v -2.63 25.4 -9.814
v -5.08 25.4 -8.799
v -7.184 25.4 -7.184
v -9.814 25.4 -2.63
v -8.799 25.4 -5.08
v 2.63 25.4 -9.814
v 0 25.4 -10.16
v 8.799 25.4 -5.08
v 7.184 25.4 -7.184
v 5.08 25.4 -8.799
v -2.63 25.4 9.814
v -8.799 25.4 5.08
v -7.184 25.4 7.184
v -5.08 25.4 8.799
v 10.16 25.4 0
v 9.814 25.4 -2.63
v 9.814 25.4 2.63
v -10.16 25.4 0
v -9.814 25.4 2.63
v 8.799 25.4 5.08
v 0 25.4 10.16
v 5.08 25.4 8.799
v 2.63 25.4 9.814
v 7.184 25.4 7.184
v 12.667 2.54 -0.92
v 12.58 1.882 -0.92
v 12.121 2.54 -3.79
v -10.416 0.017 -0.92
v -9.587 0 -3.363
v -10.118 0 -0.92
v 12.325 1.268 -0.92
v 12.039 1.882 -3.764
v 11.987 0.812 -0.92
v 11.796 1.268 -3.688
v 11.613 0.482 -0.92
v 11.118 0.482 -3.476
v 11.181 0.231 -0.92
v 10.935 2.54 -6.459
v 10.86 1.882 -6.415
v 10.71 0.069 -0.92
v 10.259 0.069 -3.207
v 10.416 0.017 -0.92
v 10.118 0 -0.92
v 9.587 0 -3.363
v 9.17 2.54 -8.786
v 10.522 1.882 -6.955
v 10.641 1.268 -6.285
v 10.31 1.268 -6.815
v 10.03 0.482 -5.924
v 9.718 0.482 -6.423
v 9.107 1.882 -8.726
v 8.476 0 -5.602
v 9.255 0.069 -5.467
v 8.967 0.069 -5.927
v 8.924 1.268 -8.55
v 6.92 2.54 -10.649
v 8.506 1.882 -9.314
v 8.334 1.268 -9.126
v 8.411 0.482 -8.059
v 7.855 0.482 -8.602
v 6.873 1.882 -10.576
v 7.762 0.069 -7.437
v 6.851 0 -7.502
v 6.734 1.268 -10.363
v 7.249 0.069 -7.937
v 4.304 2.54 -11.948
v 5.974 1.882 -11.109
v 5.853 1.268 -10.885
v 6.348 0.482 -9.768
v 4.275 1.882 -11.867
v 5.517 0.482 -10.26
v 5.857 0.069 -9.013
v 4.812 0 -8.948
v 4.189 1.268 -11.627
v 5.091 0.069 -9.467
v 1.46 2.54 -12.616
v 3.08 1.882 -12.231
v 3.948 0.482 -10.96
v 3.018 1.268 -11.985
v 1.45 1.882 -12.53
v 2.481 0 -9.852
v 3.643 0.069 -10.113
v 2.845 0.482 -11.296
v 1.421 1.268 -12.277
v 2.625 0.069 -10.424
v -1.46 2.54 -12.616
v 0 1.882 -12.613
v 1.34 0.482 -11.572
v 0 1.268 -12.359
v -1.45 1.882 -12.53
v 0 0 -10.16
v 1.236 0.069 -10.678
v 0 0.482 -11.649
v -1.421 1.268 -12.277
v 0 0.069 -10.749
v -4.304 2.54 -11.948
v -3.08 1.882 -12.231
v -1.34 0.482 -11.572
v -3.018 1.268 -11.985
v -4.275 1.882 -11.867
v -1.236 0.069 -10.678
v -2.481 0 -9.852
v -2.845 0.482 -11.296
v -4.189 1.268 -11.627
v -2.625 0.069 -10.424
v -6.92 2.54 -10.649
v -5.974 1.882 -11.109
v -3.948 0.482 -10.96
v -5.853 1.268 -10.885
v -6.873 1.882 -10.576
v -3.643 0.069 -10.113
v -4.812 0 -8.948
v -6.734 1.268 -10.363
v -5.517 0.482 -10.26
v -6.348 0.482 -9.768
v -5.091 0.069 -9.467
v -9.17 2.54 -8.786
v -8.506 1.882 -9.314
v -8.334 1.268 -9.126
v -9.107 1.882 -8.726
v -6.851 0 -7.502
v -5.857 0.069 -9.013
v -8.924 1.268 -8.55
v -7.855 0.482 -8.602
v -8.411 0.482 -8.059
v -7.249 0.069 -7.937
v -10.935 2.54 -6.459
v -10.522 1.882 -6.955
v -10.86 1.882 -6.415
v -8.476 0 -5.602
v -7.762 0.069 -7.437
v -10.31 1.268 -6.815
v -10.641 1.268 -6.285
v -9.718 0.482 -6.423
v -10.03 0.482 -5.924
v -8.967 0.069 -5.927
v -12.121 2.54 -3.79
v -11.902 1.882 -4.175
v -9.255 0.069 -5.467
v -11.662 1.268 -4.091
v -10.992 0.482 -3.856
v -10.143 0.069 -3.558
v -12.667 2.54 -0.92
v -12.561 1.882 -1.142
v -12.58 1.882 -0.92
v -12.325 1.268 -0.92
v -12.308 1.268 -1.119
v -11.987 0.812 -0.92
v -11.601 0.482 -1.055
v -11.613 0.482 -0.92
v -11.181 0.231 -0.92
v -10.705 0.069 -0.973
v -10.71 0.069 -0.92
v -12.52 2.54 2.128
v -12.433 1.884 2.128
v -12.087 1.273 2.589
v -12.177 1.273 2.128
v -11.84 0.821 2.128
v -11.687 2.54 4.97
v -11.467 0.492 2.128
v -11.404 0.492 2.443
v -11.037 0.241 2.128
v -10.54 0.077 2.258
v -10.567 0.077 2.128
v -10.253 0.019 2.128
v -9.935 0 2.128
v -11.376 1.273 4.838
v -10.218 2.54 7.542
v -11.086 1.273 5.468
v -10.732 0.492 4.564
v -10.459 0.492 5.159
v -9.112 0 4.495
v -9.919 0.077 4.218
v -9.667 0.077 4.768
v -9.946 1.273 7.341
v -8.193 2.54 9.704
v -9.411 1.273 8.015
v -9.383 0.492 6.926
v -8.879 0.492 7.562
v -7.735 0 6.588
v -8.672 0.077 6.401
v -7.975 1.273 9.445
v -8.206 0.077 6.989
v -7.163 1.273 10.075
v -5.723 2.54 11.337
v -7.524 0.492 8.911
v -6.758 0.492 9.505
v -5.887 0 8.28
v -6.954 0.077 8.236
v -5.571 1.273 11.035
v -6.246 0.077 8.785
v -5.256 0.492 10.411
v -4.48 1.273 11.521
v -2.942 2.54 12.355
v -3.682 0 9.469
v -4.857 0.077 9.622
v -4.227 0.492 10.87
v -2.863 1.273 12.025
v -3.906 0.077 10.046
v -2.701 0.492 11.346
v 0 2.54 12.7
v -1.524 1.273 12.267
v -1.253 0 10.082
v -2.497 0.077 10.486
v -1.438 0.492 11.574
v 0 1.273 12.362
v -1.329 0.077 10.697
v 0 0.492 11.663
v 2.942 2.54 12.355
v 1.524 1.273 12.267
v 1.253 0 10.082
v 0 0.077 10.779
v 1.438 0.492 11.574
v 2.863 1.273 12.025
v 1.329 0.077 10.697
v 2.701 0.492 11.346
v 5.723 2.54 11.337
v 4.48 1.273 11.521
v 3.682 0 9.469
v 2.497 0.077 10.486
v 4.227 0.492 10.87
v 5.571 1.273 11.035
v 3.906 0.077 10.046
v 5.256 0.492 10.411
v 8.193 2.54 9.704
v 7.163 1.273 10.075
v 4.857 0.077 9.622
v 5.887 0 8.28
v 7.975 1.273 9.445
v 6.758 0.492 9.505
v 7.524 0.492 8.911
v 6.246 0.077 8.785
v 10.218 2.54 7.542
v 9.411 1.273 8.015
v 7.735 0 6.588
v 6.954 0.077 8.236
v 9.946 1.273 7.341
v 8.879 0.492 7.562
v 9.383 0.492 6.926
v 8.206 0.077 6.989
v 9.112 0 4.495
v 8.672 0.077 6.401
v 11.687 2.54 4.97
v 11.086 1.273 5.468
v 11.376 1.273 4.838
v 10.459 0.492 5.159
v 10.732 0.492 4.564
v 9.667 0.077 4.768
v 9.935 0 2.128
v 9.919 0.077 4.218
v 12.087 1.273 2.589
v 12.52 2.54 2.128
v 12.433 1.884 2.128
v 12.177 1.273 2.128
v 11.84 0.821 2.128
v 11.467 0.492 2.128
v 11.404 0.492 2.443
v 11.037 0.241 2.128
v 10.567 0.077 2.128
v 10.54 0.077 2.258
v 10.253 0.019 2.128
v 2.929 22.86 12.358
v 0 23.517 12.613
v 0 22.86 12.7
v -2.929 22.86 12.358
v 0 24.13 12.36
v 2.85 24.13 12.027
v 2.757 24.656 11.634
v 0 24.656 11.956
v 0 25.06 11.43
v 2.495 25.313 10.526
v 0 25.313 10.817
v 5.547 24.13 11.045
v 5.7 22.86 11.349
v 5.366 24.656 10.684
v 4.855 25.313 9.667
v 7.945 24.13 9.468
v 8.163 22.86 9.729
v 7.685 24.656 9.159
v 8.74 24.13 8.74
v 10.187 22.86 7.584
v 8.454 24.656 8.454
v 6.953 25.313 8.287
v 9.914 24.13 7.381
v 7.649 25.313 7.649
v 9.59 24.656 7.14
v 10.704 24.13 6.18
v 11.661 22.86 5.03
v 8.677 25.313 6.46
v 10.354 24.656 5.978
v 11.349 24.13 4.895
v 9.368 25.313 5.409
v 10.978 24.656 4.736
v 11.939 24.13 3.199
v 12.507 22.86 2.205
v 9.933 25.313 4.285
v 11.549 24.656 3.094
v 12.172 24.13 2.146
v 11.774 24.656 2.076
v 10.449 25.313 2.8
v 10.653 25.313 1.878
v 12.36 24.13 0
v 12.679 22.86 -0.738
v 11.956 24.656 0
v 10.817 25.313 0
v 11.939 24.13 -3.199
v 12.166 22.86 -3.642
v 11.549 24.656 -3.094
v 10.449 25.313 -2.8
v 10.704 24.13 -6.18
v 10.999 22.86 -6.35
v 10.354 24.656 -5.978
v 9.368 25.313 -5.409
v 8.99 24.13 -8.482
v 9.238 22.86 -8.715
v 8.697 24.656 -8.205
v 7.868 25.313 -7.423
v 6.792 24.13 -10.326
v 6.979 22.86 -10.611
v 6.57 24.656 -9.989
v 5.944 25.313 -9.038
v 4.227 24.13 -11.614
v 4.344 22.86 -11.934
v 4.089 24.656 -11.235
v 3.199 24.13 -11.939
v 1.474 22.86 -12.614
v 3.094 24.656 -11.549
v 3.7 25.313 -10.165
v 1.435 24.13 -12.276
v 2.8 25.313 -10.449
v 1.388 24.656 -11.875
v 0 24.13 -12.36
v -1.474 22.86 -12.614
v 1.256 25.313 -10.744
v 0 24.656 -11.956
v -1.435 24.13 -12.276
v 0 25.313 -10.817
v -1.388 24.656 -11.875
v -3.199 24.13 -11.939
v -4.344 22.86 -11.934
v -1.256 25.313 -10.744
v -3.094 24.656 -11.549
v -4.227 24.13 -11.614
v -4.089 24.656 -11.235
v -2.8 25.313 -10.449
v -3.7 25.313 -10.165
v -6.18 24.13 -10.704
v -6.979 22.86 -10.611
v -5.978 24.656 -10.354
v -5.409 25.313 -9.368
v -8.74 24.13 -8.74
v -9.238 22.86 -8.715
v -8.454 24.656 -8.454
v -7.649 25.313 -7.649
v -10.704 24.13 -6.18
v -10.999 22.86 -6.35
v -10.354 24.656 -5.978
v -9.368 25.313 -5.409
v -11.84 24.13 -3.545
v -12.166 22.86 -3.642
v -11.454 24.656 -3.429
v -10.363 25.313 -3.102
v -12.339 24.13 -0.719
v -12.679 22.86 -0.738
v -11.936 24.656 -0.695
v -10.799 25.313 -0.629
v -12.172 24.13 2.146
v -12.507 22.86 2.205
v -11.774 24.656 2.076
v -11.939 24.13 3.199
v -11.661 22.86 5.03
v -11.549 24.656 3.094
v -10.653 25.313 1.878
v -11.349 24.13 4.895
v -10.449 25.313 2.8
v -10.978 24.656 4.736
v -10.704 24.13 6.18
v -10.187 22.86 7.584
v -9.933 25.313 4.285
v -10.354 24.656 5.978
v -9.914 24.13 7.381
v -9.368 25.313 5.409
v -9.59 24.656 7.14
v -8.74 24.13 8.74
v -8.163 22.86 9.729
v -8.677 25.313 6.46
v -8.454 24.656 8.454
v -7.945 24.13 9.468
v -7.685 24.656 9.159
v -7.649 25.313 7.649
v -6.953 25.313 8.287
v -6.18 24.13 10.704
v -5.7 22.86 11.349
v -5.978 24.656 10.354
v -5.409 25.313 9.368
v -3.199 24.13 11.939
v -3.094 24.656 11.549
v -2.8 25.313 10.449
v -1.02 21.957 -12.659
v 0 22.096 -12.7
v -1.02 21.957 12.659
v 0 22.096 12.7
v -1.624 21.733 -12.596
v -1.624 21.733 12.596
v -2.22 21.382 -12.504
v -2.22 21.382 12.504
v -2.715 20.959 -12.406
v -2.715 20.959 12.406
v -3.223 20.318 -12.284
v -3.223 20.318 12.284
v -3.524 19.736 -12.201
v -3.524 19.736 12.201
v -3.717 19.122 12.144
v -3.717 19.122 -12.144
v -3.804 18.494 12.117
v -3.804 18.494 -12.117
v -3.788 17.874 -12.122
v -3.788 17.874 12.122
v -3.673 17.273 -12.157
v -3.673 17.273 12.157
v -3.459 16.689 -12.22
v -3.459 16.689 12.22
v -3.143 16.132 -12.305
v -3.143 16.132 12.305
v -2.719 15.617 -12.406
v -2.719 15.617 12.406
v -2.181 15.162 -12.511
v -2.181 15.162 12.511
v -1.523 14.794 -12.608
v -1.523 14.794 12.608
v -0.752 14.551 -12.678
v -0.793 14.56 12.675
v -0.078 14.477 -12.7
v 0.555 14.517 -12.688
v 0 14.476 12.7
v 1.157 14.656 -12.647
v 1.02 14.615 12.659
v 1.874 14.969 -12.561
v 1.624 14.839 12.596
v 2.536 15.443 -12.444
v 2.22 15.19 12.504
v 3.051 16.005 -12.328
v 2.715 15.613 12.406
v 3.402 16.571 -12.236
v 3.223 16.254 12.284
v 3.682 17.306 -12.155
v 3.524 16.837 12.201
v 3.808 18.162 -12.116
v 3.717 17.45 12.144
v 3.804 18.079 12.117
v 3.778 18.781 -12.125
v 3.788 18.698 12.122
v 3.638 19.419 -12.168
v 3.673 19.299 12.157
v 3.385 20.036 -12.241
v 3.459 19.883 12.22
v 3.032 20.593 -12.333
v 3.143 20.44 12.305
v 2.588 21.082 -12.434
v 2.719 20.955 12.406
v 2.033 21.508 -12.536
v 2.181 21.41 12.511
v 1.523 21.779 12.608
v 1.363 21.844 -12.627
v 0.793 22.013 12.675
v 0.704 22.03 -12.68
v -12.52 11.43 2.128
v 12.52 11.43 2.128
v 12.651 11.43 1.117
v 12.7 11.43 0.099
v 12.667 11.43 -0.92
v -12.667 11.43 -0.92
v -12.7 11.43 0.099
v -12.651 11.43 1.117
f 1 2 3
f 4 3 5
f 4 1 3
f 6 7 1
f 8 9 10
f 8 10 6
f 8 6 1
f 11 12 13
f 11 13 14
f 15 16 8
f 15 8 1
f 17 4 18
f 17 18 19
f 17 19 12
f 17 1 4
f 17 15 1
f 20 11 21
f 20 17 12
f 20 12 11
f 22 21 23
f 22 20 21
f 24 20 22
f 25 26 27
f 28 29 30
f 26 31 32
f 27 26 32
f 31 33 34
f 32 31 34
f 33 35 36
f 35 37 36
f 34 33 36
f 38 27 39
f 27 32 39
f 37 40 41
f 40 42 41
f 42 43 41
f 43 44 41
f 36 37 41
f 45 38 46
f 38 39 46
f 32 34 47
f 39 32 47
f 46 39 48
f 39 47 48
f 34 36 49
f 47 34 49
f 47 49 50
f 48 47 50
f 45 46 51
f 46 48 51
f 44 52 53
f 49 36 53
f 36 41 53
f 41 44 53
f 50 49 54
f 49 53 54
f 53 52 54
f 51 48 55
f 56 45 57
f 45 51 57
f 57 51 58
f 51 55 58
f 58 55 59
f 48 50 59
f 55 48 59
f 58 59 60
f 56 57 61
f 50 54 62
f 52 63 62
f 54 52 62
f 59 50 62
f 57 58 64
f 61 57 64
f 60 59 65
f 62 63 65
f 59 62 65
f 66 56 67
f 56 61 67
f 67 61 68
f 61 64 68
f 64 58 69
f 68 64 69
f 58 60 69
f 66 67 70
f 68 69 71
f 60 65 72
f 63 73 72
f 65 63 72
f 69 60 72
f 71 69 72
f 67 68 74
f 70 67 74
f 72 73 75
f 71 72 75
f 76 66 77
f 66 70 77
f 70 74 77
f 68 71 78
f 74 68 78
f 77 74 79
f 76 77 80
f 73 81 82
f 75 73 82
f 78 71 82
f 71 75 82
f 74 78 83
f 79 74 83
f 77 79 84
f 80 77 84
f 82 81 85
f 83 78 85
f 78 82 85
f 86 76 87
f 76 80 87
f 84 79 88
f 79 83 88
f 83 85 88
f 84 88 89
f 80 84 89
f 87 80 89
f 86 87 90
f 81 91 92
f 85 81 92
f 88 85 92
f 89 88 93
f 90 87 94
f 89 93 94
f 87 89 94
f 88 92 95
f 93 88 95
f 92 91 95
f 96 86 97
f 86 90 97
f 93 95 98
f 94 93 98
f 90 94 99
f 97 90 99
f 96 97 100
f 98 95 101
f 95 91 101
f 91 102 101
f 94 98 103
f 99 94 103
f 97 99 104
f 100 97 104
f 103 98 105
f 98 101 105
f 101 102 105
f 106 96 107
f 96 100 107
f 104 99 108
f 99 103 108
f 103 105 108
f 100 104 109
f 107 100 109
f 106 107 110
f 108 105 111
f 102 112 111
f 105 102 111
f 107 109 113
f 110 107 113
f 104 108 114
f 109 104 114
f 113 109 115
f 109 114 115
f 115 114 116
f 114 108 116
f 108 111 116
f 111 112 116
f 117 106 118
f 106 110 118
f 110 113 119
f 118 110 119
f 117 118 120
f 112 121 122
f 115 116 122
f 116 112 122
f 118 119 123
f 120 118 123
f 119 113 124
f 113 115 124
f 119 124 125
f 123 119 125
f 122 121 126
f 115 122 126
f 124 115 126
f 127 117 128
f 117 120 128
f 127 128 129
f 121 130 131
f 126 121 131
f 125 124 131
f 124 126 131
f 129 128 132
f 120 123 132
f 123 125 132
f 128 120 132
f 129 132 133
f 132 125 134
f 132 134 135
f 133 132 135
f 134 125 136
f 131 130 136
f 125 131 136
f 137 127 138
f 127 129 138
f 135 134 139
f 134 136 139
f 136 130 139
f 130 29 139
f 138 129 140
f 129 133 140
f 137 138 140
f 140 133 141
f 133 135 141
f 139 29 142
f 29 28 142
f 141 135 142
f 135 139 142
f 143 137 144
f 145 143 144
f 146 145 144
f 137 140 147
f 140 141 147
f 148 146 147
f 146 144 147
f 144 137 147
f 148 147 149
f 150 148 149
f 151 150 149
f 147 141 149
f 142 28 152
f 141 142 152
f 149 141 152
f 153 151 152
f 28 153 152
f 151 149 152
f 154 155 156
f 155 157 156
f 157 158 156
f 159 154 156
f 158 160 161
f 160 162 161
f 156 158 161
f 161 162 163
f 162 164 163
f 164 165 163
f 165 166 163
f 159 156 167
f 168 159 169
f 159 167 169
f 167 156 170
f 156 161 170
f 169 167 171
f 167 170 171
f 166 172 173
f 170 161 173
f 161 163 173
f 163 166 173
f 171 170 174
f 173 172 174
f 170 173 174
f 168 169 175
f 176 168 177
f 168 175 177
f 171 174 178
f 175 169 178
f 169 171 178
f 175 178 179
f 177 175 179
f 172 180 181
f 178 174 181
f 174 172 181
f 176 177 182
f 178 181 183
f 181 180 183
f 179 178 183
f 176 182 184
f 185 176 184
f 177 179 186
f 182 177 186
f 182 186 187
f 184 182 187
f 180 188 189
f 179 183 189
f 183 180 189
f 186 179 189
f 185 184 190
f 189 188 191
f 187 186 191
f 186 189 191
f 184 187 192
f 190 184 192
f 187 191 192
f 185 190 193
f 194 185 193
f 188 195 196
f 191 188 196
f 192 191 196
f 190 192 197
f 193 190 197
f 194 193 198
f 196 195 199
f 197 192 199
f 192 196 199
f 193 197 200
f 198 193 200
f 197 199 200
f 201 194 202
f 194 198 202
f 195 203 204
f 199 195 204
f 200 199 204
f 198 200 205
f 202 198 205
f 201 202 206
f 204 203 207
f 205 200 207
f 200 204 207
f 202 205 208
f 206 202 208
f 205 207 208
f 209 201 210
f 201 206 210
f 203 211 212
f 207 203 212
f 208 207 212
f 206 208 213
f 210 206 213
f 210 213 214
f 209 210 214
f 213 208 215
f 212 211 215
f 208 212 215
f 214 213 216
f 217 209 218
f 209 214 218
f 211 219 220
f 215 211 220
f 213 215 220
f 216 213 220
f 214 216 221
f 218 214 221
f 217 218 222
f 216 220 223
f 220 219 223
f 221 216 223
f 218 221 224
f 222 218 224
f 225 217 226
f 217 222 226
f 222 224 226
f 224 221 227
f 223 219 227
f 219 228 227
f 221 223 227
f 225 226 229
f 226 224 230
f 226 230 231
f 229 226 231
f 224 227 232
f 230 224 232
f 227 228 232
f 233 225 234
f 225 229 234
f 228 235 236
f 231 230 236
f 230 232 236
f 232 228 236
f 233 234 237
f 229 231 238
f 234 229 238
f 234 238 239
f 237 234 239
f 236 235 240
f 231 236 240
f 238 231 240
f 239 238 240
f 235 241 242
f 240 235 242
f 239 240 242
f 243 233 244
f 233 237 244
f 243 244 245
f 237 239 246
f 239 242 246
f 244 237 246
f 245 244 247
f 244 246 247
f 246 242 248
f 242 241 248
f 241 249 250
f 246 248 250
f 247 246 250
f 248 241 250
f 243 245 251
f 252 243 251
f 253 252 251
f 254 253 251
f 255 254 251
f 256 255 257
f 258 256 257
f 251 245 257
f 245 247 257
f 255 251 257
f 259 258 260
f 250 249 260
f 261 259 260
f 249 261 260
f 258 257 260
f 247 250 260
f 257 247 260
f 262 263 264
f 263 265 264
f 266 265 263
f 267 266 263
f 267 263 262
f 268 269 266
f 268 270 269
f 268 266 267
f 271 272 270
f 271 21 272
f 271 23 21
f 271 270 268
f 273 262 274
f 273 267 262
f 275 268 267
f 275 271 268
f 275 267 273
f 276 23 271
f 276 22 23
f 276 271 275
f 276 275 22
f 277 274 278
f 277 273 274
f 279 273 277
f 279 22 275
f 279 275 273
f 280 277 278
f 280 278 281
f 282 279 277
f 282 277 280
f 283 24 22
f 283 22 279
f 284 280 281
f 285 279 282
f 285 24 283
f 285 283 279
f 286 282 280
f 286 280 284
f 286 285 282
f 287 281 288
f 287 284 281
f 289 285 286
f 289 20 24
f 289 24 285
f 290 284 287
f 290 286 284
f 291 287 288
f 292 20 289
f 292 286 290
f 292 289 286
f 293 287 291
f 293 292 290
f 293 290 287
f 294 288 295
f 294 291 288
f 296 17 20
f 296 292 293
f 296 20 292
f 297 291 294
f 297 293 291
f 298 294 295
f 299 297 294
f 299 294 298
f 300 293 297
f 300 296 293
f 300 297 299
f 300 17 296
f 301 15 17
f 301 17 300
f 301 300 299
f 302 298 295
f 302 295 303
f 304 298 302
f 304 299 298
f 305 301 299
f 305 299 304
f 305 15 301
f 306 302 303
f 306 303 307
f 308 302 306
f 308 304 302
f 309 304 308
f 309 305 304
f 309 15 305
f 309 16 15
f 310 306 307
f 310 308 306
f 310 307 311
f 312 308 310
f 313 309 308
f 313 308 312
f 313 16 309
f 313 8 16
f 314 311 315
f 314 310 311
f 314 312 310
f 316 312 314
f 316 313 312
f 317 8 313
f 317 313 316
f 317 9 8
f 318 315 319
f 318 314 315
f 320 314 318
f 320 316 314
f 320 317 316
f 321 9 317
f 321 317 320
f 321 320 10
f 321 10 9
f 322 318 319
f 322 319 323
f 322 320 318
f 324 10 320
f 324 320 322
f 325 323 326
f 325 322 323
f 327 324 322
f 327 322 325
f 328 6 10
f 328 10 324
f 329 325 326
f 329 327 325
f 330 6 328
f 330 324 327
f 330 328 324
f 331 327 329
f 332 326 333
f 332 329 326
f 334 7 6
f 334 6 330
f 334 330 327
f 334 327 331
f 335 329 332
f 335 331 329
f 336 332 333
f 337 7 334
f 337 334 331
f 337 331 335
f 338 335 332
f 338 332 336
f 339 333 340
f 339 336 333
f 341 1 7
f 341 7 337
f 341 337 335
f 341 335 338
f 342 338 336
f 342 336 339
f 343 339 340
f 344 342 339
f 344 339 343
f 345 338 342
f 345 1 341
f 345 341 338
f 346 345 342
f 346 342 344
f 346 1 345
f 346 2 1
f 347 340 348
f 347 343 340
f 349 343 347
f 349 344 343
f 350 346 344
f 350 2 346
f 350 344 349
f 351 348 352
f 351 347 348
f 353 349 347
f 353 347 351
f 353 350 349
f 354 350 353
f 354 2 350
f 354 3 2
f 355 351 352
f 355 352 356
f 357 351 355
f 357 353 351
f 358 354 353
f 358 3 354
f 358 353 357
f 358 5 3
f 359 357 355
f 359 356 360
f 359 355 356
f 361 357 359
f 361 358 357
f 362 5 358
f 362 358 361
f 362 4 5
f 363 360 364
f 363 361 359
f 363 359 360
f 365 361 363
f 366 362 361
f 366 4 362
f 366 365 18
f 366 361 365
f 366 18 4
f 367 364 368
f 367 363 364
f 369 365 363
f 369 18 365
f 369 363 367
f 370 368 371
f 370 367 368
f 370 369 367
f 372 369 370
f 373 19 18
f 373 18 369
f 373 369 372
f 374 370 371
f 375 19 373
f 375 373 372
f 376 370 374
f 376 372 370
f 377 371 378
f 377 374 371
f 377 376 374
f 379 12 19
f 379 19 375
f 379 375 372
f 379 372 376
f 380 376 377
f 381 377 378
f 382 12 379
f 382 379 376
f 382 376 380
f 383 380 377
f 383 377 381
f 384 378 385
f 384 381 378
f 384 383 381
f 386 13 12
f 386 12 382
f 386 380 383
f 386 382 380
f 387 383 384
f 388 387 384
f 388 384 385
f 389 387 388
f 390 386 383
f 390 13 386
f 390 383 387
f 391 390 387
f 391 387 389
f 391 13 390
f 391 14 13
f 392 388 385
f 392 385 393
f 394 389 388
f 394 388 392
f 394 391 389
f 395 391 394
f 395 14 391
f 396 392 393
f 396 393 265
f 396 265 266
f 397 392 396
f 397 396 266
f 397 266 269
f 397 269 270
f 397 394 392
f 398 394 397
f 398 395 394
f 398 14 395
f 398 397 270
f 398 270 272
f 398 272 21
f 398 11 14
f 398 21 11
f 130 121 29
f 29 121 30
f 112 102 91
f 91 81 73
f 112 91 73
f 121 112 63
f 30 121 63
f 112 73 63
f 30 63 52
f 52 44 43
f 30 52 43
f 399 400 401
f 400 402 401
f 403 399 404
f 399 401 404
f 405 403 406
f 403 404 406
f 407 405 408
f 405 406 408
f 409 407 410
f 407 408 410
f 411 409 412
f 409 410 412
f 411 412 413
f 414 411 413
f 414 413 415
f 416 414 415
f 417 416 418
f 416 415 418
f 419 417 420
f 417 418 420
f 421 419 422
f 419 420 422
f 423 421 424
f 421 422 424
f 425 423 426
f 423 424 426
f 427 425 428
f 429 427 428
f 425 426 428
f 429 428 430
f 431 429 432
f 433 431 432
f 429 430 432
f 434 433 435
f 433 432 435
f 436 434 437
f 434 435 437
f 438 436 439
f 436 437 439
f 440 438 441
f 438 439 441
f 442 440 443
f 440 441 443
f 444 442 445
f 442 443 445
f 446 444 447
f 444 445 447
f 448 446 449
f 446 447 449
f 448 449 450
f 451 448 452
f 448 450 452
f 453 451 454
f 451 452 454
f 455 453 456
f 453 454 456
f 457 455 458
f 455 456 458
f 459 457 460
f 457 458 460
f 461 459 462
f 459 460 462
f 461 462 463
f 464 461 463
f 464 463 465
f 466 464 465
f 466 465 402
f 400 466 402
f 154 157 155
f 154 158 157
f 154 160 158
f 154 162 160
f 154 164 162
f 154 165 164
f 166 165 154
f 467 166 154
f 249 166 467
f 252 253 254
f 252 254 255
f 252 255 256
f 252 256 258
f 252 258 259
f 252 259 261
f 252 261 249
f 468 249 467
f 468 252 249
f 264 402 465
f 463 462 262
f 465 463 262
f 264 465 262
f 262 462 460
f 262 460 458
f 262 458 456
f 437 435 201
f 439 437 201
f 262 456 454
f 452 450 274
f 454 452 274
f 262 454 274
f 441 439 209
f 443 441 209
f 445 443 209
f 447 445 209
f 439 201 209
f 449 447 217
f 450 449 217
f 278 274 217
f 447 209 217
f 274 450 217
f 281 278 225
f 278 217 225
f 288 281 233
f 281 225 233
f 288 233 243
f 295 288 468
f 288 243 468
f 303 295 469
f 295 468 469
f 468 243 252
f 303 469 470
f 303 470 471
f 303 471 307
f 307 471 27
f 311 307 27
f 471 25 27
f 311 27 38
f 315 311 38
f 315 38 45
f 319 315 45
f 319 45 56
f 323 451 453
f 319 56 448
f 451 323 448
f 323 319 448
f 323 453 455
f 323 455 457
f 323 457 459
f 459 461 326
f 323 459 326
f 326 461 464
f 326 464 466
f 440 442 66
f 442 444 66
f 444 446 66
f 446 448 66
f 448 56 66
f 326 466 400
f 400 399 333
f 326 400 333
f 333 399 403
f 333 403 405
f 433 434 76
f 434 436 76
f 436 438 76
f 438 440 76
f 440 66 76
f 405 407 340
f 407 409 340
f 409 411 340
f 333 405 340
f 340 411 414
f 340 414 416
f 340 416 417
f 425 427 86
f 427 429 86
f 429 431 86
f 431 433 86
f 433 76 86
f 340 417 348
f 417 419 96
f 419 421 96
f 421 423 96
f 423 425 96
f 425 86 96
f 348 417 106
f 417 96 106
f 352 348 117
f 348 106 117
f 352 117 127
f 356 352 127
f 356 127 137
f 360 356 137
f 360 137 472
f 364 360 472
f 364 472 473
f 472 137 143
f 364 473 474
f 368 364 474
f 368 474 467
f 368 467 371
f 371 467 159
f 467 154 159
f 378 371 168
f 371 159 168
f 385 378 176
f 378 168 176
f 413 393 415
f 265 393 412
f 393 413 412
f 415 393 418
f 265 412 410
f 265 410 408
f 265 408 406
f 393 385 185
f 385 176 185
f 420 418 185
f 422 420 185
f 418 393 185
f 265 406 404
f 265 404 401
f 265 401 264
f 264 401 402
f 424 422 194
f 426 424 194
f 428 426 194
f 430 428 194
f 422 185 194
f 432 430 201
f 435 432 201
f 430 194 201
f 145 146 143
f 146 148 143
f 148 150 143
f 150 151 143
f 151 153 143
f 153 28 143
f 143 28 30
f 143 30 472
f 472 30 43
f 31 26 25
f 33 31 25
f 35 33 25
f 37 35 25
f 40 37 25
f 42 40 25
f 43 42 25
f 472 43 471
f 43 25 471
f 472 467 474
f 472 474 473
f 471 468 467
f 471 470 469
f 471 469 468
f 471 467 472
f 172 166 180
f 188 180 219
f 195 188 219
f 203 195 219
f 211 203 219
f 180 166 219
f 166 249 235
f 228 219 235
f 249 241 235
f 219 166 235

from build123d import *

# Parameters (mm, degrees)
SKETCH1_R           = 12.7
BOSS_EXTRUDE1_DEPTH = 25.4
SKETCH2_R           = 3.81
CUT_EXTRUDE1_DEPTH  = 25.4
SKETCH3_W           = 3.048
SKETCH3_H           = 11.43
CUT_EXTRUDE2_DEPTH  = 25.4
FILLET1_R           = 2.54


with BuildPart() as part:
    # Sketch1 → Boss-Extrude1 (new body)
    with BuildSketch(Plane(origin=(0, 0, 0), x_dir=(1, 0, 0), z_dir=(0, 1, 0))):
        with Locations(Location((0, 0, 0), (0, 0, 270))):
            Circle(SKETCH1_R)
    extrude(amount=BOSS_EXTRUDE1_DEPTH)

    # Sketch2 → Cut-Extrude1 (cut, symmetric)
    with BuildSketch(Plane.XY):
        with Locations(Location((0, 18.286129729, 0), (0, 0, 90.000000018))):
            Circle(SKETCH2_R)
    extrude(amount=CUT_EXTRUDE1_DEPTH, both=True, mode=Mode.SUBTRACT)

    # Sketch3 → Cut-Extrude2 (cut, symmetric)
    with BuildSketch(Plane(origin=(0, 0, 0), x_dir=(0, 0, -1), z_dir=(1, 0, 0))):
        with Locations((-0.60404942, 5.715)):
            Rectangle(SKETCH3_W, SKETCH3_H)
    extrude(amount=CUT_EXTRUDE2_DEPTH, both=True, mode=Mode.SUBTRACT)

    # Fillet1
    fillet1_edges = [part.edges().sort_by_distance(p)[0] for p in [
        (0, 0, -12.7),
        (8.193405042, 0, 9.703510386),
        (0, 25.4, -12.7),
    ]]
    fillet(fillet1_edges, radius=FILLET1_R)


solid = part.part
